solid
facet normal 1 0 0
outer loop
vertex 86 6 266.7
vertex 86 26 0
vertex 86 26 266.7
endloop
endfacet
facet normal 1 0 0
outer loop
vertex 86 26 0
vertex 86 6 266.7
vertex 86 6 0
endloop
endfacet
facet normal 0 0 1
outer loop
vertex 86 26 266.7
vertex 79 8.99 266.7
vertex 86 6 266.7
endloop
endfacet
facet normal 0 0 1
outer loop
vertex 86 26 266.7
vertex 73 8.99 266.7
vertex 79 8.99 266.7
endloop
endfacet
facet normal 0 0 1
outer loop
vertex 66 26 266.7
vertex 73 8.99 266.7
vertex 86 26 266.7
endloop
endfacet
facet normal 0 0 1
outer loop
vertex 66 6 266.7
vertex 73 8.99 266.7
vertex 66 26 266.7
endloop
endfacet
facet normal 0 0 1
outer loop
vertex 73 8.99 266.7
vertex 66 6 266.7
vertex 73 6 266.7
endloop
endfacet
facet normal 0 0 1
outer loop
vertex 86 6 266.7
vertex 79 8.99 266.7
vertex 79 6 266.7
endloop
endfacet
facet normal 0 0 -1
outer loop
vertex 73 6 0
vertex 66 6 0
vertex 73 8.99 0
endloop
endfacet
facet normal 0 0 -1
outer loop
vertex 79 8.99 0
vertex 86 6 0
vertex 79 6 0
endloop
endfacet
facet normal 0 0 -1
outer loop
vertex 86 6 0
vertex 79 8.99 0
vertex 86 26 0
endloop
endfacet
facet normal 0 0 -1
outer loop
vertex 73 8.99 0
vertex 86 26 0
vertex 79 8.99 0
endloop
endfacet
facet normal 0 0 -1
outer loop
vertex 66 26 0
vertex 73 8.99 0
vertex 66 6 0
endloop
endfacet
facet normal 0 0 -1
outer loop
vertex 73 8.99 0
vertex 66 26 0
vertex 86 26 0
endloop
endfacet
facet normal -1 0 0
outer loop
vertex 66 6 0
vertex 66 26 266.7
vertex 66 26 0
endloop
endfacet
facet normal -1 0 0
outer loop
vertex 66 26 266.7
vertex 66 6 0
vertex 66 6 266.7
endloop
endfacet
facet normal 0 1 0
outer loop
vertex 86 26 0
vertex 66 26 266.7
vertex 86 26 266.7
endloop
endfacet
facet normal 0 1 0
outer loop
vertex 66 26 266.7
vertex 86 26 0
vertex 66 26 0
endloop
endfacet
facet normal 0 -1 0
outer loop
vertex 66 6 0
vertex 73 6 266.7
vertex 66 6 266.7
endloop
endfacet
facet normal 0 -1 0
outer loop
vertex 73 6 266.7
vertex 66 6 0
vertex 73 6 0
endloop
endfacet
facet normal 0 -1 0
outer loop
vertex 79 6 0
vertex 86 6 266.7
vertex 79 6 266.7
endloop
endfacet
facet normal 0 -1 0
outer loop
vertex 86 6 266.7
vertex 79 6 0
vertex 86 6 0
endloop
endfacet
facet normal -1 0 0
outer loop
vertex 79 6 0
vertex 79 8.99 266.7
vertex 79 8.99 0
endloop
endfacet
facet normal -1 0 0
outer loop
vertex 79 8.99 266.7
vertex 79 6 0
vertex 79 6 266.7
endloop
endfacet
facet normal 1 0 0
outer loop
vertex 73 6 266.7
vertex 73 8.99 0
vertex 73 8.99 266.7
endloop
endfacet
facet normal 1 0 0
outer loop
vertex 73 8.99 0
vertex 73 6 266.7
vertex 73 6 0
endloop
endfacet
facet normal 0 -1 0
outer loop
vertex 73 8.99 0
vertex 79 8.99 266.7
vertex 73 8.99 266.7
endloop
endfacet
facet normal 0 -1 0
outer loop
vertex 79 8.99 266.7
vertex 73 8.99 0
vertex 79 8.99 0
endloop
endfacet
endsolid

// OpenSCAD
// file: config.scad
// ============================================================
//  config.scad — shared dimensions (single source of truth)
//  Every other file includes this. Change a number here and
//  the part files AND the assembly update together.
//  Units: mm.  Z is up.
// ============================================================

/* ----- rack ----- */
U       = 44.45;
span_U  = 6;
span    = span_U * U;        // 266.7 — spine length / mount span
post_t  = 4;
post_w  = 25;

/* ----- fan ----- */
fan_size  = 120;
fan_thick = 25;
fan_pitch = 105;
fan_hole_d = 4.5;            // M4 clearance (anti-vibration washers under the head)
bore_d    = 112;

/* ----- carrier ----- */
thickness       = 6;         // one thickness -> flat part (print or waterjet/CNC)
frame_corner_r  = 4;
gap_to_spine    = 6;
mount_bolt_d    = 5.5;       // M5 clearance into T-nuts
mount_bolt_span = 90;
slot_travel     = 6;
flange_height   = 100;

/* ----- spine (2020) ----- */
ext_width  = 20;

/* ----- fan heights along the rail ----- */
fan1_z = fan_size/2 + 5;
fan2_z = span - fan_size/2 - 5;

/* ----- derived placement (shared by carrier + spine + bracket) ----- */
spine_face_x   = fan_size/2 + gap_to_spine;   // 66
spine_center_x = spine_face_x + ext_width/2;  // 76
wing_x0        = fan_size/2 - 4;              // 56
wing_x1        = spine_face_x + ext_width;    // 86
post_x         = wing_x1 + 12;                // 98 (post inner face)

$fn = 64;
eps = 0.01;
// main file
// ============================================================
//  spine.scad — the 2020 extrusion spine (off-the-shelf stand-in)
//  In reality you buy this cut to length; modelled for the assembly.
// ============================================================
include <config.scad>

module spine() {
    color("Silver")
    translate([spine_face_x, thickness, 0])
        difference() {
            cube([ext_width, ext_width, span]);
            // front-facing slot (toward the fans)
            translate([ext_width/2 - 3, -eps, -eps])
                cube([6, 3, span + 2*eps]);
        }
}

spine();
